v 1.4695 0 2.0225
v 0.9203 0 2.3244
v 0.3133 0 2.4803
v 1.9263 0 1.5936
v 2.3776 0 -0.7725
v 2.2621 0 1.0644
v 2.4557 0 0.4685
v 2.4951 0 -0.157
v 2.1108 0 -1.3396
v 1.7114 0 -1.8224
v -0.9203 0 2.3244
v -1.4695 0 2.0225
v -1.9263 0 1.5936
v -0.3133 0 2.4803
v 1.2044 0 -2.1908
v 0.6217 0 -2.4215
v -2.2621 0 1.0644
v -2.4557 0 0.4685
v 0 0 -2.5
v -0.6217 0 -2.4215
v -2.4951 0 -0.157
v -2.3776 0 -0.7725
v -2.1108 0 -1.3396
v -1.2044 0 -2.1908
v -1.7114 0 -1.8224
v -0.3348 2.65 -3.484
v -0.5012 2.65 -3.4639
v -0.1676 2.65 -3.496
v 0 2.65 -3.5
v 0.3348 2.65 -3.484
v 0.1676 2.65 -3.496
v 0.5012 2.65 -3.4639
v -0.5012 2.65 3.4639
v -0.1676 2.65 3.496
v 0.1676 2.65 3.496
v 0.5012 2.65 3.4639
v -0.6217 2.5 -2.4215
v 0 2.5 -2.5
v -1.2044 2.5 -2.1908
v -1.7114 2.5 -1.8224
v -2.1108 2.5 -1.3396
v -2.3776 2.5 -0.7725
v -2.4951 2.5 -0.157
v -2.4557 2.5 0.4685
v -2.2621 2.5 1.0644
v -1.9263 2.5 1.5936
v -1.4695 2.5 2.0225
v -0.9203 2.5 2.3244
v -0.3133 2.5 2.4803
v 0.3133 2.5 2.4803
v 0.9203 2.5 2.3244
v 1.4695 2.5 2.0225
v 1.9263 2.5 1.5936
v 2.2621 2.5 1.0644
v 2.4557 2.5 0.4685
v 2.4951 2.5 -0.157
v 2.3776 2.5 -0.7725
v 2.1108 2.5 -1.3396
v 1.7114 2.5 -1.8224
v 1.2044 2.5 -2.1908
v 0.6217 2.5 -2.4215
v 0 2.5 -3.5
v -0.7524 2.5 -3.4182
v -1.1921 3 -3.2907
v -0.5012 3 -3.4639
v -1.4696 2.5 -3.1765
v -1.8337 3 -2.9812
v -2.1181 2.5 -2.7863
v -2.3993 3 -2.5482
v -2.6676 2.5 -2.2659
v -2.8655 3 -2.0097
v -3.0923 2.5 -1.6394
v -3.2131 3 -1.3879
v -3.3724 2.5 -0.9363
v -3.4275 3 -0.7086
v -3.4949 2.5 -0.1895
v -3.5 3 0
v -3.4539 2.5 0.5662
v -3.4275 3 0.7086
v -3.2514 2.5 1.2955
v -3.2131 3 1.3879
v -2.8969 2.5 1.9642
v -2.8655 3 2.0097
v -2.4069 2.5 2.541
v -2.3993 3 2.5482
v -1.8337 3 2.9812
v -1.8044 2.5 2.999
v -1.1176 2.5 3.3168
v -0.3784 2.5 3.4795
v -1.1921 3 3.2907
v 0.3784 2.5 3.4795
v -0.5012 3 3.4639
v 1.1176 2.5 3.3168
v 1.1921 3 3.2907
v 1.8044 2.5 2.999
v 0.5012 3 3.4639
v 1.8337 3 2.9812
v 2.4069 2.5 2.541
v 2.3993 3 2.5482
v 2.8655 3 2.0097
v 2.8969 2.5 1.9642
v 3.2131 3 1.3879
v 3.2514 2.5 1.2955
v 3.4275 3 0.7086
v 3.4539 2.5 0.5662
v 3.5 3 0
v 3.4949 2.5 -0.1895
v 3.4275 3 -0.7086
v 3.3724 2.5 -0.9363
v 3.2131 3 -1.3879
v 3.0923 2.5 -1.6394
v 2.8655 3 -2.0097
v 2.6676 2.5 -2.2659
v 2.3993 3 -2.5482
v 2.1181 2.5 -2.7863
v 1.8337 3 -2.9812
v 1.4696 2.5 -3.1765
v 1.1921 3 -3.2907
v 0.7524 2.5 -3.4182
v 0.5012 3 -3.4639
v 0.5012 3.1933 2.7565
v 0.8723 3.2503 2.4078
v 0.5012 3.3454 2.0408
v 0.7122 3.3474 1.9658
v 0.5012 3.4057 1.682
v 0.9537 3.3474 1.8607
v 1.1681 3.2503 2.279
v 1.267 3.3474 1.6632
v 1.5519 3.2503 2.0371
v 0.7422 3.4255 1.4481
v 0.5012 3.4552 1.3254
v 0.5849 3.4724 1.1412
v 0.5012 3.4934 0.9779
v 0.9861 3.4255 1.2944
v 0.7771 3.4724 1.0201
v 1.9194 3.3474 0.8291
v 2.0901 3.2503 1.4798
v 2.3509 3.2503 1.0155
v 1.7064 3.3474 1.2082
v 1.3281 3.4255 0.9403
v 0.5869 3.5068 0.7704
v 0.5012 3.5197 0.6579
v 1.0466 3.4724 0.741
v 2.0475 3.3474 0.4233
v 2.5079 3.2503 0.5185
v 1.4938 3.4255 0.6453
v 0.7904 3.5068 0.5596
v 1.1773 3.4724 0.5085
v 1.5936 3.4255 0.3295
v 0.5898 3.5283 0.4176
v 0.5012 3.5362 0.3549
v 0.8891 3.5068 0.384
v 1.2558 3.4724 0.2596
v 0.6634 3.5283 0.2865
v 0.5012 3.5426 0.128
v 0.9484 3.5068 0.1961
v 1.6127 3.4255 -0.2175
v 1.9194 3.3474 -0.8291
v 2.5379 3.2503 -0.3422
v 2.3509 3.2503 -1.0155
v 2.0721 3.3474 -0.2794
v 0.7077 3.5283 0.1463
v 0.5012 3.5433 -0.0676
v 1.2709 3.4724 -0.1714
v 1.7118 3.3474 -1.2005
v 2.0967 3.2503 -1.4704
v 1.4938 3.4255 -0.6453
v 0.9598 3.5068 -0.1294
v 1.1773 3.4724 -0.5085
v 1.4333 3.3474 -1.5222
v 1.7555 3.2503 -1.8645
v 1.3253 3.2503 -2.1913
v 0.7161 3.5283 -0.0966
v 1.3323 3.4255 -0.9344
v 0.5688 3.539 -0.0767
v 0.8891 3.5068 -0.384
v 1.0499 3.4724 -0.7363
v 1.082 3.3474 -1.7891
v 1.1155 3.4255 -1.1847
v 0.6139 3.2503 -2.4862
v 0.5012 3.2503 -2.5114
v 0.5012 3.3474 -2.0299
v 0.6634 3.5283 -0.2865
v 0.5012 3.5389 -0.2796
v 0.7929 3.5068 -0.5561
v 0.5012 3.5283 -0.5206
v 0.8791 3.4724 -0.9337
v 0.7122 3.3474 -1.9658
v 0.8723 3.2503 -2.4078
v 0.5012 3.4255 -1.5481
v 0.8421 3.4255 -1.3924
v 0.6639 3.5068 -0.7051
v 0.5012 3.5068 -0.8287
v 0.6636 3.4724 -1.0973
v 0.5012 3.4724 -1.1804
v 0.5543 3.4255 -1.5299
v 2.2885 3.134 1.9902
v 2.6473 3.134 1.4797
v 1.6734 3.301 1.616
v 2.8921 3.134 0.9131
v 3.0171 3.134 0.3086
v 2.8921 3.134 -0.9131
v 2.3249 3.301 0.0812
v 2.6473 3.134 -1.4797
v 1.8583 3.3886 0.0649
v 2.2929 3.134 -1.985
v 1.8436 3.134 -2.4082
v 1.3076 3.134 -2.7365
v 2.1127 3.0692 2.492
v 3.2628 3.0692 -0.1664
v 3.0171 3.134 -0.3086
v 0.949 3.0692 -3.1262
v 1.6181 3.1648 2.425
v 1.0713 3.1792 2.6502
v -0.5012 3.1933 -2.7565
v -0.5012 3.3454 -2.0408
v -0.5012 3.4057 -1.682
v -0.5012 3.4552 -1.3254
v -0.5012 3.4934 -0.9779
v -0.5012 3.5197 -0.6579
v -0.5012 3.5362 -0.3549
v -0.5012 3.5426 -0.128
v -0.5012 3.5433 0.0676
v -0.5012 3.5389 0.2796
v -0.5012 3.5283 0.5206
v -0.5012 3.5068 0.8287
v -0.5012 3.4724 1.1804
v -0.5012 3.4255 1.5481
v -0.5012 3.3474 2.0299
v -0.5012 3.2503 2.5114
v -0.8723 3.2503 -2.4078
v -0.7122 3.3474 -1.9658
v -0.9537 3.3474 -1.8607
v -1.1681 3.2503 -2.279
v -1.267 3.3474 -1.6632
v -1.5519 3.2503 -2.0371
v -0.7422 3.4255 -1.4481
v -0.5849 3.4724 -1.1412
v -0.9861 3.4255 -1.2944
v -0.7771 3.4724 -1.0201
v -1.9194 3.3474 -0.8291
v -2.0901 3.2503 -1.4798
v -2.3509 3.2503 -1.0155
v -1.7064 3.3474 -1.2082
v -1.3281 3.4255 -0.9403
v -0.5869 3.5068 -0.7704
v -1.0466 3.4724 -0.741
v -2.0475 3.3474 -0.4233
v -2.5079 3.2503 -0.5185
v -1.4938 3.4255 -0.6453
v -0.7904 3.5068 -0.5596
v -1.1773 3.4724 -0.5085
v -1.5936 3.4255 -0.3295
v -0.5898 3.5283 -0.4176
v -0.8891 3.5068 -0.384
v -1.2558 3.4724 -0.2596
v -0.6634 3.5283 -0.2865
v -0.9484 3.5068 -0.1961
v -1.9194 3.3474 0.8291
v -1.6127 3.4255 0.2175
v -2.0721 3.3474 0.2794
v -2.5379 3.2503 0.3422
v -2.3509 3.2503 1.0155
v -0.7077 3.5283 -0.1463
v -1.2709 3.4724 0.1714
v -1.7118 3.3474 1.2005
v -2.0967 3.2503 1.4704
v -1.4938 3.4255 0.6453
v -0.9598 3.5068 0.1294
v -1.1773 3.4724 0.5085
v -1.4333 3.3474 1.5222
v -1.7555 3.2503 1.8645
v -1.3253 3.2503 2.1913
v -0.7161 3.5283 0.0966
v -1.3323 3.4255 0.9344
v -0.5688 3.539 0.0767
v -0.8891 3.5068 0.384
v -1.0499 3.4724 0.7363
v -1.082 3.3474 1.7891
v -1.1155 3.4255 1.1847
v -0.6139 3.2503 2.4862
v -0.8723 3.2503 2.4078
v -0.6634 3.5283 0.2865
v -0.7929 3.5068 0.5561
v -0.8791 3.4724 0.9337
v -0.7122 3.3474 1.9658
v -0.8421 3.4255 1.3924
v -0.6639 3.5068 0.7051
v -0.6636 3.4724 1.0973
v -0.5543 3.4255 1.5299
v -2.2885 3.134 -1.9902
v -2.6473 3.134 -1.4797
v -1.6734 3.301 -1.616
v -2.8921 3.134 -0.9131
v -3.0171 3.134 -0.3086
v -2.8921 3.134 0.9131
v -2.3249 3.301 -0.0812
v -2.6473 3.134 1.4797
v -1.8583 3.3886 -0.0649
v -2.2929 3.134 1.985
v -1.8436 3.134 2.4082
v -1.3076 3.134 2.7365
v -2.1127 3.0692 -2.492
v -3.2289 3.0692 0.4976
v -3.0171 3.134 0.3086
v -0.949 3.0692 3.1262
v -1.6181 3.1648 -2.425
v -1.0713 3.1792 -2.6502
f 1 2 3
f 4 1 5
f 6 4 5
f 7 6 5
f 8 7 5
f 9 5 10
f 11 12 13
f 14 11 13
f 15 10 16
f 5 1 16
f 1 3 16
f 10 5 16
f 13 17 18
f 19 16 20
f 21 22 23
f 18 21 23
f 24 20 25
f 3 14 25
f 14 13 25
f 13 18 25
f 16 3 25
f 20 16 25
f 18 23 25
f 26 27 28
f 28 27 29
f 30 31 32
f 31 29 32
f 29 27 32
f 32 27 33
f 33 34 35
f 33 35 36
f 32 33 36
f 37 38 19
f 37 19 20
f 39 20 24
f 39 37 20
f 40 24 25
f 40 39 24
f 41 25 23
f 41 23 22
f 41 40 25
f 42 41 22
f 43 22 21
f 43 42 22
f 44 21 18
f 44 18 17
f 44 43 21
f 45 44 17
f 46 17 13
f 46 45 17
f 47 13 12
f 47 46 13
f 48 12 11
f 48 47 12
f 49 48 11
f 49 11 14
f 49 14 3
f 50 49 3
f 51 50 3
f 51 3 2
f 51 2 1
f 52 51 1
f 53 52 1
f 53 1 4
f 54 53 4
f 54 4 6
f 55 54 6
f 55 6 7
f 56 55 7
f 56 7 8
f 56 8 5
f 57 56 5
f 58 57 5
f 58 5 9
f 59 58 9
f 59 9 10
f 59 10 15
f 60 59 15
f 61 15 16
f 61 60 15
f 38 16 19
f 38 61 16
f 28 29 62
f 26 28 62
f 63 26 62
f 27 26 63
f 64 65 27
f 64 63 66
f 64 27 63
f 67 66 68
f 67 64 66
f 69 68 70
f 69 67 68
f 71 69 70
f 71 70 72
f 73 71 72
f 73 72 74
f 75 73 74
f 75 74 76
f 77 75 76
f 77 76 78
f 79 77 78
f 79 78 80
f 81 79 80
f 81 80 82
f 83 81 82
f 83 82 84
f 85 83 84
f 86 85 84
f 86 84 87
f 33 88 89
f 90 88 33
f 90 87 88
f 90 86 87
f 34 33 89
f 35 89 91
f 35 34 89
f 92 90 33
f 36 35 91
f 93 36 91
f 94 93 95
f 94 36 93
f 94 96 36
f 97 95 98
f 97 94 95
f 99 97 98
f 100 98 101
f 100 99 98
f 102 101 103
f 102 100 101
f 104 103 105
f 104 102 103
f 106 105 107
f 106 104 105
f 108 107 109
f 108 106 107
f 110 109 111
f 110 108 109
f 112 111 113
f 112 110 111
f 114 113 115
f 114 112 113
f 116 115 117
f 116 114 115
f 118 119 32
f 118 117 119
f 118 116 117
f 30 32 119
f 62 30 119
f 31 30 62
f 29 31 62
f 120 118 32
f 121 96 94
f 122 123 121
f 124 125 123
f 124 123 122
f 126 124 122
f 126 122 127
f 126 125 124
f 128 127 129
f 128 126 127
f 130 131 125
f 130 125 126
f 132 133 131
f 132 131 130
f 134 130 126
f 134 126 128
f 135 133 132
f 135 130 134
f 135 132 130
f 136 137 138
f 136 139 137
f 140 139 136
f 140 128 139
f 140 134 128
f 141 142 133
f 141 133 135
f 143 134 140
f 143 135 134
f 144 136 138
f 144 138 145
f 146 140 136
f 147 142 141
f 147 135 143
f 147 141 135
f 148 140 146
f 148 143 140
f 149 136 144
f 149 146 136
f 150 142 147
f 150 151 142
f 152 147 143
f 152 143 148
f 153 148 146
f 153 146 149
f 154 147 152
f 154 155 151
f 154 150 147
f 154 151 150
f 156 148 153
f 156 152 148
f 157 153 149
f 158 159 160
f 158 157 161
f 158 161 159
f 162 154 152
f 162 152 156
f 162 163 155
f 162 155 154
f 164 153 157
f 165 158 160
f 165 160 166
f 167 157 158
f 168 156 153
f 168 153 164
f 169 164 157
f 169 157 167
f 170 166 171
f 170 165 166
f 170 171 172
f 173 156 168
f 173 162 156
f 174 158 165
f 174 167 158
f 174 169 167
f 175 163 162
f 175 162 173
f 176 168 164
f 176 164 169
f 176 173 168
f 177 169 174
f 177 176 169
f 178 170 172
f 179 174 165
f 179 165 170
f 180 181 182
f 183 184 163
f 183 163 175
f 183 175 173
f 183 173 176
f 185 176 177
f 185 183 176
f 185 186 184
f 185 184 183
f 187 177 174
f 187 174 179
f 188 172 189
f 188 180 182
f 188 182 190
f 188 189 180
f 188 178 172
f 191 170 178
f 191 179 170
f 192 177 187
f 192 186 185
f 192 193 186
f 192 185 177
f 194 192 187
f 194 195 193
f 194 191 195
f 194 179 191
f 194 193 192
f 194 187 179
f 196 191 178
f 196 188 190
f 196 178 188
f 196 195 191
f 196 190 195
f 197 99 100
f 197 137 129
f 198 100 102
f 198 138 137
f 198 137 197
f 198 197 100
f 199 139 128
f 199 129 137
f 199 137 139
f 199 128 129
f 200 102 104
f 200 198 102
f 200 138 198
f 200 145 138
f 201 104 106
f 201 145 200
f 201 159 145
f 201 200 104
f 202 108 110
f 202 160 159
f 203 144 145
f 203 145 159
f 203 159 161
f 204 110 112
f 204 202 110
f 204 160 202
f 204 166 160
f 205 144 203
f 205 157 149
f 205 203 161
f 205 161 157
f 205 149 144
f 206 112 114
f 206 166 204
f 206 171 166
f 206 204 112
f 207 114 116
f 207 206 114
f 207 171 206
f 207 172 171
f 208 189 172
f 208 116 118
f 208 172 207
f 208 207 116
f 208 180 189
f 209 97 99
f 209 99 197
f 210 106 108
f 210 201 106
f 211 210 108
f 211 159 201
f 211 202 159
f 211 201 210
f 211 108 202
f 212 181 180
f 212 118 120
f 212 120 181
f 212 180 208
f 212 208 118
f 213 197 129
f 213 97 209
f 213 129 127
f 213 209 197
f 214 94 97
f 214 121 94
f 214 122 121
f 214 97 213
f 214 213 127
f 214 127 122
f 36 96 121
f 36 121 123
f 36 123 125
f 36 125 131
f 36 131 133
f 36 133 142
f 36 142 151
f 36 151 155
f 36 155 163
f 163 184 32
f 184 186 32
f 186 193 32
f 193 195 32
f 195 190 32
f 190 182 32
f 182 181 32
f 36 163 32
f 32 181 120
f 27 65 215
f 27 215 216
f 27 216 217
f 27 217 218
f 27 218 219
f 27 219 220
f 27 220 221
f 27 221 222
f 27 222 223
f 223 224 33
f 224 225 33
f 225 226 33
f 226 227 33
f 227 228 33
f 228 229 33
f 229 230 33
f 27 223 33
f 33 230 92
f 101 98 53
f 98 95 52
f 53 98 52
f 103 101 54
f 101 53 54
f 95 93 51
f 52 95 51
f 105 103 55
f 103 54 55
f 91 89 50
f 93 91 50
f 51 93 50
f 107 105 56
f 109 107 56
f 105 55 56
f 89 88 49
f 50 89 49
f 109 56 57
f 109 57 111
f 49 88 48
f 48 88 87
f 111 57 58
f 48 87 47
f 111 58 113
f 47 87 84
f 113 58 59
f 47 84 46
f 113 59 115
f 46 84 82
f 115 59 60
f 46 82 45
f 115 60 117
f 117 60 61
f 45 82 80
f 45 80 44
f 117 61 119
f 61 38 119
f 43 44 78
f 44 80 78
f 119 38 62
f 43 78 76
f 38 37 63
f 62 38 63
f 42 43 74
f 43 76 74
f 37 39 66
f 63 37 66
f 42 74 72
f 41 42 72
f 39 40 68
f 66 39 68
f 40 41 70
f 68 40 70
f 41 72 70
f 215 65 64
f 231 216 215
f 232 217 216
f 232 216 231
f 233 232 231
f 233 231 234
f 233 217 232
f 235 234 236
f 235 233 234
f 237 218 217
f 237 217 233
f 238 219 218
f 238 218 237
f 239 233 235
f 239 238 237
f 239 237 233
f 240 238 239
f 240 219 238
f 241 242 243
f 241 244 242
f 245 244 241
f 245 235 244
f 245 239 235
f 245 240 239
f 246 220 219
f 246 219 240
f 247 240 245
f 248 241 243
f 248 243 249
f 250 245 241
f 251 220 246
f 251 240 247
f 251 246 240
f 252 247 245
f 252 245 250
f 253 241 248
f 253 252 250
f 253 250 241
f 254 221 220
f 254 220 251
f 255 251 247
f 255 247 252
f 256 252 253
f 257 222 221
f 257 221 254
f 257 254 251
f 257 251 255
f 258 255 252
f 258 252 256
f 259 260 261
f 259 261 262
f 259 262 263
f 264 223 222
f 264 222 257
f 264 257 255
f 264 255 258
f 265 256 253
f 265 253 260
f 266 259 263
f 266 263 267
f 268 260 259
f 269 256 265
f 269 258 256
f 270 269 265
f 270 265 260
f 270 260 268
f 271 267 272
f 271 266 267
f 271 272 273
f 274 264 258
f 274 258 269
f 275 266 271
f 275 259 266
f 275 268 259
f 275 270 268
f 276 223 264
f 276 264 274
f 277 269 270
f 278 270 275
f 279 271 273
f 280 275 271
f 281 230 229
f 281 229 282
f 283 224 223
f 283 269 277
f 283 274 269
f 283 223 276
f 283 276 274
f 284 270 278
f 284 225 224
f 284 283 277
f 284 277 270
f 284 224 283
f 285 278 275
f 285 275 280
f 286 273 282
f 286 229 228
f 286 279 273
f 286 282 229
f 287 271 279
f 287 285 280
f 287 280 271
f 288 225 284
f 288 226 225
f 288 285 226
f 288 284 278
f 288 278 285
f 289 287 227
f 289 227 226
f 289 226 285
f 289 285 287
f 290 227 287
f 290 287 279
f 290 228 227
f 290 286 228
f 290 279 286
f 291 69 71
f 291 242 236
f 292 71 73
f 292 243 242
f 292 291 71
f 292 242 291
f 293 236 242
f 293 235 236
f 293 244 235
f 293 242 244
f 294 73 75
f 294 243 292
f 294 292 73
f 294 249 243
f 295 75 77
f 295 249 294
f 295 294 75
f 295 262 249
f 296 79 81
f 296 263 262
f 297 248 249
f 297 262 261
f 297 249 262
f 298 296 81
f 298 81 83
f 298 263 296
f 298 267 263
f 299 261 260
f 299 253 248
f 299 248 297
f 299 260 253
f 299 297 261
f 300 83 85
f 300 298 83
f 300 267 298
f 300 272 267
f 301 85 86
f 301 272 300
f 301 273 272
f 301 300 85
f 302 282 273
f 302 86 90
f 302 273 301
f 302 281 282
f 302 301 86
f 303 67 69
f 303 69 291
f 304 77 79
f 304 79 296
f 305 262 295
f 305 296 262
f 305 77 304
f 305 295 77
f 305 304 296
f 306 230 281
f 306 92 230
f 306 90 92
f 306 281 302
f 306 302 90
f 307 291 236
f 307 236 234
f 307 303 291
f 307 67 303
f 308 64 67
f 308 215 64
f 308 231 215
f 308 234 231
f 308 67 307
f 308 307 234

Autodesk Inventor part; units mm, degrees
ref_plane "YZ Plane" through (0, 0, 0) normal (1, 0, 0) x (0, 1, 0)
ref_plane "XZ Plane" through (0, 0, 0) normal (0, 1, 0) x (-1, 0, 0)
sketch "Esboço1" plane through (0, 0, 0) normal (1, 0, 0) x (0, 1, 0)
  line L0 (0, 0) -> (2.5, 0)
  line L1 (2.5, -2.5) -> (2.5, -3.5)
  line L2 (2.5, -3.5) -> (3, -3.5)
  line L3 (2.5, 0) -> (3, 0)
  line L4 (2.5, 0) -> (3.693, 0)
  arc A0 (3, -3.5) -> (3.564, 0) centre (-9.2697, 0.2726) ccw
  line L5 (0, 0) -> (0, -2.5)
  line L6 (0, -2.5) -> (2.5, -2.5)
  dimension "d0" = 2.5
  dimension "d1" = 3.5
  dimension "d3" = 0.5
  dimension "d11" = 2.5
revolve "Revolução1" add sketch "Esboço1" angle 360 about axis through (0, 0, 0) along (0, 1, 0)
thread "Rosca1" size "M6x1" class "6g" standard "ANSI Metric M Profile" full length
ref_plane "Plano de trabalho1" through (0, 4.25, 0) normal (0, -1, 0) x (1, 0, 0)
sketch "Esboço2" plane through (0, 4.25, 0) normal (0, -1, 0) x (1, 0, 0)
  line L0 (-0.5012, 4.0955) -> (0.5012, 4.0955)
  line L1 (0.5012, 4.0955) -> (0.5012, -4.0955)
  line L2 (0.5012, -4.0955) -> (-0.5012, -4.0955)
  line L3 (-0.5012, -4.0955) -> (-0.5012, 4.0955)
  line L4 (-0.5012, 4.0955) -> (0.5012, -4.0955) construction
  line L5 (0.5012, 4.0955) -> (-0.5012, -4.0955) construction
  point P0 (0, 0)
extrude "Extrusão1" cut sketch "Esboço2" along normal blind 1.6
properties part number "parafusos"
